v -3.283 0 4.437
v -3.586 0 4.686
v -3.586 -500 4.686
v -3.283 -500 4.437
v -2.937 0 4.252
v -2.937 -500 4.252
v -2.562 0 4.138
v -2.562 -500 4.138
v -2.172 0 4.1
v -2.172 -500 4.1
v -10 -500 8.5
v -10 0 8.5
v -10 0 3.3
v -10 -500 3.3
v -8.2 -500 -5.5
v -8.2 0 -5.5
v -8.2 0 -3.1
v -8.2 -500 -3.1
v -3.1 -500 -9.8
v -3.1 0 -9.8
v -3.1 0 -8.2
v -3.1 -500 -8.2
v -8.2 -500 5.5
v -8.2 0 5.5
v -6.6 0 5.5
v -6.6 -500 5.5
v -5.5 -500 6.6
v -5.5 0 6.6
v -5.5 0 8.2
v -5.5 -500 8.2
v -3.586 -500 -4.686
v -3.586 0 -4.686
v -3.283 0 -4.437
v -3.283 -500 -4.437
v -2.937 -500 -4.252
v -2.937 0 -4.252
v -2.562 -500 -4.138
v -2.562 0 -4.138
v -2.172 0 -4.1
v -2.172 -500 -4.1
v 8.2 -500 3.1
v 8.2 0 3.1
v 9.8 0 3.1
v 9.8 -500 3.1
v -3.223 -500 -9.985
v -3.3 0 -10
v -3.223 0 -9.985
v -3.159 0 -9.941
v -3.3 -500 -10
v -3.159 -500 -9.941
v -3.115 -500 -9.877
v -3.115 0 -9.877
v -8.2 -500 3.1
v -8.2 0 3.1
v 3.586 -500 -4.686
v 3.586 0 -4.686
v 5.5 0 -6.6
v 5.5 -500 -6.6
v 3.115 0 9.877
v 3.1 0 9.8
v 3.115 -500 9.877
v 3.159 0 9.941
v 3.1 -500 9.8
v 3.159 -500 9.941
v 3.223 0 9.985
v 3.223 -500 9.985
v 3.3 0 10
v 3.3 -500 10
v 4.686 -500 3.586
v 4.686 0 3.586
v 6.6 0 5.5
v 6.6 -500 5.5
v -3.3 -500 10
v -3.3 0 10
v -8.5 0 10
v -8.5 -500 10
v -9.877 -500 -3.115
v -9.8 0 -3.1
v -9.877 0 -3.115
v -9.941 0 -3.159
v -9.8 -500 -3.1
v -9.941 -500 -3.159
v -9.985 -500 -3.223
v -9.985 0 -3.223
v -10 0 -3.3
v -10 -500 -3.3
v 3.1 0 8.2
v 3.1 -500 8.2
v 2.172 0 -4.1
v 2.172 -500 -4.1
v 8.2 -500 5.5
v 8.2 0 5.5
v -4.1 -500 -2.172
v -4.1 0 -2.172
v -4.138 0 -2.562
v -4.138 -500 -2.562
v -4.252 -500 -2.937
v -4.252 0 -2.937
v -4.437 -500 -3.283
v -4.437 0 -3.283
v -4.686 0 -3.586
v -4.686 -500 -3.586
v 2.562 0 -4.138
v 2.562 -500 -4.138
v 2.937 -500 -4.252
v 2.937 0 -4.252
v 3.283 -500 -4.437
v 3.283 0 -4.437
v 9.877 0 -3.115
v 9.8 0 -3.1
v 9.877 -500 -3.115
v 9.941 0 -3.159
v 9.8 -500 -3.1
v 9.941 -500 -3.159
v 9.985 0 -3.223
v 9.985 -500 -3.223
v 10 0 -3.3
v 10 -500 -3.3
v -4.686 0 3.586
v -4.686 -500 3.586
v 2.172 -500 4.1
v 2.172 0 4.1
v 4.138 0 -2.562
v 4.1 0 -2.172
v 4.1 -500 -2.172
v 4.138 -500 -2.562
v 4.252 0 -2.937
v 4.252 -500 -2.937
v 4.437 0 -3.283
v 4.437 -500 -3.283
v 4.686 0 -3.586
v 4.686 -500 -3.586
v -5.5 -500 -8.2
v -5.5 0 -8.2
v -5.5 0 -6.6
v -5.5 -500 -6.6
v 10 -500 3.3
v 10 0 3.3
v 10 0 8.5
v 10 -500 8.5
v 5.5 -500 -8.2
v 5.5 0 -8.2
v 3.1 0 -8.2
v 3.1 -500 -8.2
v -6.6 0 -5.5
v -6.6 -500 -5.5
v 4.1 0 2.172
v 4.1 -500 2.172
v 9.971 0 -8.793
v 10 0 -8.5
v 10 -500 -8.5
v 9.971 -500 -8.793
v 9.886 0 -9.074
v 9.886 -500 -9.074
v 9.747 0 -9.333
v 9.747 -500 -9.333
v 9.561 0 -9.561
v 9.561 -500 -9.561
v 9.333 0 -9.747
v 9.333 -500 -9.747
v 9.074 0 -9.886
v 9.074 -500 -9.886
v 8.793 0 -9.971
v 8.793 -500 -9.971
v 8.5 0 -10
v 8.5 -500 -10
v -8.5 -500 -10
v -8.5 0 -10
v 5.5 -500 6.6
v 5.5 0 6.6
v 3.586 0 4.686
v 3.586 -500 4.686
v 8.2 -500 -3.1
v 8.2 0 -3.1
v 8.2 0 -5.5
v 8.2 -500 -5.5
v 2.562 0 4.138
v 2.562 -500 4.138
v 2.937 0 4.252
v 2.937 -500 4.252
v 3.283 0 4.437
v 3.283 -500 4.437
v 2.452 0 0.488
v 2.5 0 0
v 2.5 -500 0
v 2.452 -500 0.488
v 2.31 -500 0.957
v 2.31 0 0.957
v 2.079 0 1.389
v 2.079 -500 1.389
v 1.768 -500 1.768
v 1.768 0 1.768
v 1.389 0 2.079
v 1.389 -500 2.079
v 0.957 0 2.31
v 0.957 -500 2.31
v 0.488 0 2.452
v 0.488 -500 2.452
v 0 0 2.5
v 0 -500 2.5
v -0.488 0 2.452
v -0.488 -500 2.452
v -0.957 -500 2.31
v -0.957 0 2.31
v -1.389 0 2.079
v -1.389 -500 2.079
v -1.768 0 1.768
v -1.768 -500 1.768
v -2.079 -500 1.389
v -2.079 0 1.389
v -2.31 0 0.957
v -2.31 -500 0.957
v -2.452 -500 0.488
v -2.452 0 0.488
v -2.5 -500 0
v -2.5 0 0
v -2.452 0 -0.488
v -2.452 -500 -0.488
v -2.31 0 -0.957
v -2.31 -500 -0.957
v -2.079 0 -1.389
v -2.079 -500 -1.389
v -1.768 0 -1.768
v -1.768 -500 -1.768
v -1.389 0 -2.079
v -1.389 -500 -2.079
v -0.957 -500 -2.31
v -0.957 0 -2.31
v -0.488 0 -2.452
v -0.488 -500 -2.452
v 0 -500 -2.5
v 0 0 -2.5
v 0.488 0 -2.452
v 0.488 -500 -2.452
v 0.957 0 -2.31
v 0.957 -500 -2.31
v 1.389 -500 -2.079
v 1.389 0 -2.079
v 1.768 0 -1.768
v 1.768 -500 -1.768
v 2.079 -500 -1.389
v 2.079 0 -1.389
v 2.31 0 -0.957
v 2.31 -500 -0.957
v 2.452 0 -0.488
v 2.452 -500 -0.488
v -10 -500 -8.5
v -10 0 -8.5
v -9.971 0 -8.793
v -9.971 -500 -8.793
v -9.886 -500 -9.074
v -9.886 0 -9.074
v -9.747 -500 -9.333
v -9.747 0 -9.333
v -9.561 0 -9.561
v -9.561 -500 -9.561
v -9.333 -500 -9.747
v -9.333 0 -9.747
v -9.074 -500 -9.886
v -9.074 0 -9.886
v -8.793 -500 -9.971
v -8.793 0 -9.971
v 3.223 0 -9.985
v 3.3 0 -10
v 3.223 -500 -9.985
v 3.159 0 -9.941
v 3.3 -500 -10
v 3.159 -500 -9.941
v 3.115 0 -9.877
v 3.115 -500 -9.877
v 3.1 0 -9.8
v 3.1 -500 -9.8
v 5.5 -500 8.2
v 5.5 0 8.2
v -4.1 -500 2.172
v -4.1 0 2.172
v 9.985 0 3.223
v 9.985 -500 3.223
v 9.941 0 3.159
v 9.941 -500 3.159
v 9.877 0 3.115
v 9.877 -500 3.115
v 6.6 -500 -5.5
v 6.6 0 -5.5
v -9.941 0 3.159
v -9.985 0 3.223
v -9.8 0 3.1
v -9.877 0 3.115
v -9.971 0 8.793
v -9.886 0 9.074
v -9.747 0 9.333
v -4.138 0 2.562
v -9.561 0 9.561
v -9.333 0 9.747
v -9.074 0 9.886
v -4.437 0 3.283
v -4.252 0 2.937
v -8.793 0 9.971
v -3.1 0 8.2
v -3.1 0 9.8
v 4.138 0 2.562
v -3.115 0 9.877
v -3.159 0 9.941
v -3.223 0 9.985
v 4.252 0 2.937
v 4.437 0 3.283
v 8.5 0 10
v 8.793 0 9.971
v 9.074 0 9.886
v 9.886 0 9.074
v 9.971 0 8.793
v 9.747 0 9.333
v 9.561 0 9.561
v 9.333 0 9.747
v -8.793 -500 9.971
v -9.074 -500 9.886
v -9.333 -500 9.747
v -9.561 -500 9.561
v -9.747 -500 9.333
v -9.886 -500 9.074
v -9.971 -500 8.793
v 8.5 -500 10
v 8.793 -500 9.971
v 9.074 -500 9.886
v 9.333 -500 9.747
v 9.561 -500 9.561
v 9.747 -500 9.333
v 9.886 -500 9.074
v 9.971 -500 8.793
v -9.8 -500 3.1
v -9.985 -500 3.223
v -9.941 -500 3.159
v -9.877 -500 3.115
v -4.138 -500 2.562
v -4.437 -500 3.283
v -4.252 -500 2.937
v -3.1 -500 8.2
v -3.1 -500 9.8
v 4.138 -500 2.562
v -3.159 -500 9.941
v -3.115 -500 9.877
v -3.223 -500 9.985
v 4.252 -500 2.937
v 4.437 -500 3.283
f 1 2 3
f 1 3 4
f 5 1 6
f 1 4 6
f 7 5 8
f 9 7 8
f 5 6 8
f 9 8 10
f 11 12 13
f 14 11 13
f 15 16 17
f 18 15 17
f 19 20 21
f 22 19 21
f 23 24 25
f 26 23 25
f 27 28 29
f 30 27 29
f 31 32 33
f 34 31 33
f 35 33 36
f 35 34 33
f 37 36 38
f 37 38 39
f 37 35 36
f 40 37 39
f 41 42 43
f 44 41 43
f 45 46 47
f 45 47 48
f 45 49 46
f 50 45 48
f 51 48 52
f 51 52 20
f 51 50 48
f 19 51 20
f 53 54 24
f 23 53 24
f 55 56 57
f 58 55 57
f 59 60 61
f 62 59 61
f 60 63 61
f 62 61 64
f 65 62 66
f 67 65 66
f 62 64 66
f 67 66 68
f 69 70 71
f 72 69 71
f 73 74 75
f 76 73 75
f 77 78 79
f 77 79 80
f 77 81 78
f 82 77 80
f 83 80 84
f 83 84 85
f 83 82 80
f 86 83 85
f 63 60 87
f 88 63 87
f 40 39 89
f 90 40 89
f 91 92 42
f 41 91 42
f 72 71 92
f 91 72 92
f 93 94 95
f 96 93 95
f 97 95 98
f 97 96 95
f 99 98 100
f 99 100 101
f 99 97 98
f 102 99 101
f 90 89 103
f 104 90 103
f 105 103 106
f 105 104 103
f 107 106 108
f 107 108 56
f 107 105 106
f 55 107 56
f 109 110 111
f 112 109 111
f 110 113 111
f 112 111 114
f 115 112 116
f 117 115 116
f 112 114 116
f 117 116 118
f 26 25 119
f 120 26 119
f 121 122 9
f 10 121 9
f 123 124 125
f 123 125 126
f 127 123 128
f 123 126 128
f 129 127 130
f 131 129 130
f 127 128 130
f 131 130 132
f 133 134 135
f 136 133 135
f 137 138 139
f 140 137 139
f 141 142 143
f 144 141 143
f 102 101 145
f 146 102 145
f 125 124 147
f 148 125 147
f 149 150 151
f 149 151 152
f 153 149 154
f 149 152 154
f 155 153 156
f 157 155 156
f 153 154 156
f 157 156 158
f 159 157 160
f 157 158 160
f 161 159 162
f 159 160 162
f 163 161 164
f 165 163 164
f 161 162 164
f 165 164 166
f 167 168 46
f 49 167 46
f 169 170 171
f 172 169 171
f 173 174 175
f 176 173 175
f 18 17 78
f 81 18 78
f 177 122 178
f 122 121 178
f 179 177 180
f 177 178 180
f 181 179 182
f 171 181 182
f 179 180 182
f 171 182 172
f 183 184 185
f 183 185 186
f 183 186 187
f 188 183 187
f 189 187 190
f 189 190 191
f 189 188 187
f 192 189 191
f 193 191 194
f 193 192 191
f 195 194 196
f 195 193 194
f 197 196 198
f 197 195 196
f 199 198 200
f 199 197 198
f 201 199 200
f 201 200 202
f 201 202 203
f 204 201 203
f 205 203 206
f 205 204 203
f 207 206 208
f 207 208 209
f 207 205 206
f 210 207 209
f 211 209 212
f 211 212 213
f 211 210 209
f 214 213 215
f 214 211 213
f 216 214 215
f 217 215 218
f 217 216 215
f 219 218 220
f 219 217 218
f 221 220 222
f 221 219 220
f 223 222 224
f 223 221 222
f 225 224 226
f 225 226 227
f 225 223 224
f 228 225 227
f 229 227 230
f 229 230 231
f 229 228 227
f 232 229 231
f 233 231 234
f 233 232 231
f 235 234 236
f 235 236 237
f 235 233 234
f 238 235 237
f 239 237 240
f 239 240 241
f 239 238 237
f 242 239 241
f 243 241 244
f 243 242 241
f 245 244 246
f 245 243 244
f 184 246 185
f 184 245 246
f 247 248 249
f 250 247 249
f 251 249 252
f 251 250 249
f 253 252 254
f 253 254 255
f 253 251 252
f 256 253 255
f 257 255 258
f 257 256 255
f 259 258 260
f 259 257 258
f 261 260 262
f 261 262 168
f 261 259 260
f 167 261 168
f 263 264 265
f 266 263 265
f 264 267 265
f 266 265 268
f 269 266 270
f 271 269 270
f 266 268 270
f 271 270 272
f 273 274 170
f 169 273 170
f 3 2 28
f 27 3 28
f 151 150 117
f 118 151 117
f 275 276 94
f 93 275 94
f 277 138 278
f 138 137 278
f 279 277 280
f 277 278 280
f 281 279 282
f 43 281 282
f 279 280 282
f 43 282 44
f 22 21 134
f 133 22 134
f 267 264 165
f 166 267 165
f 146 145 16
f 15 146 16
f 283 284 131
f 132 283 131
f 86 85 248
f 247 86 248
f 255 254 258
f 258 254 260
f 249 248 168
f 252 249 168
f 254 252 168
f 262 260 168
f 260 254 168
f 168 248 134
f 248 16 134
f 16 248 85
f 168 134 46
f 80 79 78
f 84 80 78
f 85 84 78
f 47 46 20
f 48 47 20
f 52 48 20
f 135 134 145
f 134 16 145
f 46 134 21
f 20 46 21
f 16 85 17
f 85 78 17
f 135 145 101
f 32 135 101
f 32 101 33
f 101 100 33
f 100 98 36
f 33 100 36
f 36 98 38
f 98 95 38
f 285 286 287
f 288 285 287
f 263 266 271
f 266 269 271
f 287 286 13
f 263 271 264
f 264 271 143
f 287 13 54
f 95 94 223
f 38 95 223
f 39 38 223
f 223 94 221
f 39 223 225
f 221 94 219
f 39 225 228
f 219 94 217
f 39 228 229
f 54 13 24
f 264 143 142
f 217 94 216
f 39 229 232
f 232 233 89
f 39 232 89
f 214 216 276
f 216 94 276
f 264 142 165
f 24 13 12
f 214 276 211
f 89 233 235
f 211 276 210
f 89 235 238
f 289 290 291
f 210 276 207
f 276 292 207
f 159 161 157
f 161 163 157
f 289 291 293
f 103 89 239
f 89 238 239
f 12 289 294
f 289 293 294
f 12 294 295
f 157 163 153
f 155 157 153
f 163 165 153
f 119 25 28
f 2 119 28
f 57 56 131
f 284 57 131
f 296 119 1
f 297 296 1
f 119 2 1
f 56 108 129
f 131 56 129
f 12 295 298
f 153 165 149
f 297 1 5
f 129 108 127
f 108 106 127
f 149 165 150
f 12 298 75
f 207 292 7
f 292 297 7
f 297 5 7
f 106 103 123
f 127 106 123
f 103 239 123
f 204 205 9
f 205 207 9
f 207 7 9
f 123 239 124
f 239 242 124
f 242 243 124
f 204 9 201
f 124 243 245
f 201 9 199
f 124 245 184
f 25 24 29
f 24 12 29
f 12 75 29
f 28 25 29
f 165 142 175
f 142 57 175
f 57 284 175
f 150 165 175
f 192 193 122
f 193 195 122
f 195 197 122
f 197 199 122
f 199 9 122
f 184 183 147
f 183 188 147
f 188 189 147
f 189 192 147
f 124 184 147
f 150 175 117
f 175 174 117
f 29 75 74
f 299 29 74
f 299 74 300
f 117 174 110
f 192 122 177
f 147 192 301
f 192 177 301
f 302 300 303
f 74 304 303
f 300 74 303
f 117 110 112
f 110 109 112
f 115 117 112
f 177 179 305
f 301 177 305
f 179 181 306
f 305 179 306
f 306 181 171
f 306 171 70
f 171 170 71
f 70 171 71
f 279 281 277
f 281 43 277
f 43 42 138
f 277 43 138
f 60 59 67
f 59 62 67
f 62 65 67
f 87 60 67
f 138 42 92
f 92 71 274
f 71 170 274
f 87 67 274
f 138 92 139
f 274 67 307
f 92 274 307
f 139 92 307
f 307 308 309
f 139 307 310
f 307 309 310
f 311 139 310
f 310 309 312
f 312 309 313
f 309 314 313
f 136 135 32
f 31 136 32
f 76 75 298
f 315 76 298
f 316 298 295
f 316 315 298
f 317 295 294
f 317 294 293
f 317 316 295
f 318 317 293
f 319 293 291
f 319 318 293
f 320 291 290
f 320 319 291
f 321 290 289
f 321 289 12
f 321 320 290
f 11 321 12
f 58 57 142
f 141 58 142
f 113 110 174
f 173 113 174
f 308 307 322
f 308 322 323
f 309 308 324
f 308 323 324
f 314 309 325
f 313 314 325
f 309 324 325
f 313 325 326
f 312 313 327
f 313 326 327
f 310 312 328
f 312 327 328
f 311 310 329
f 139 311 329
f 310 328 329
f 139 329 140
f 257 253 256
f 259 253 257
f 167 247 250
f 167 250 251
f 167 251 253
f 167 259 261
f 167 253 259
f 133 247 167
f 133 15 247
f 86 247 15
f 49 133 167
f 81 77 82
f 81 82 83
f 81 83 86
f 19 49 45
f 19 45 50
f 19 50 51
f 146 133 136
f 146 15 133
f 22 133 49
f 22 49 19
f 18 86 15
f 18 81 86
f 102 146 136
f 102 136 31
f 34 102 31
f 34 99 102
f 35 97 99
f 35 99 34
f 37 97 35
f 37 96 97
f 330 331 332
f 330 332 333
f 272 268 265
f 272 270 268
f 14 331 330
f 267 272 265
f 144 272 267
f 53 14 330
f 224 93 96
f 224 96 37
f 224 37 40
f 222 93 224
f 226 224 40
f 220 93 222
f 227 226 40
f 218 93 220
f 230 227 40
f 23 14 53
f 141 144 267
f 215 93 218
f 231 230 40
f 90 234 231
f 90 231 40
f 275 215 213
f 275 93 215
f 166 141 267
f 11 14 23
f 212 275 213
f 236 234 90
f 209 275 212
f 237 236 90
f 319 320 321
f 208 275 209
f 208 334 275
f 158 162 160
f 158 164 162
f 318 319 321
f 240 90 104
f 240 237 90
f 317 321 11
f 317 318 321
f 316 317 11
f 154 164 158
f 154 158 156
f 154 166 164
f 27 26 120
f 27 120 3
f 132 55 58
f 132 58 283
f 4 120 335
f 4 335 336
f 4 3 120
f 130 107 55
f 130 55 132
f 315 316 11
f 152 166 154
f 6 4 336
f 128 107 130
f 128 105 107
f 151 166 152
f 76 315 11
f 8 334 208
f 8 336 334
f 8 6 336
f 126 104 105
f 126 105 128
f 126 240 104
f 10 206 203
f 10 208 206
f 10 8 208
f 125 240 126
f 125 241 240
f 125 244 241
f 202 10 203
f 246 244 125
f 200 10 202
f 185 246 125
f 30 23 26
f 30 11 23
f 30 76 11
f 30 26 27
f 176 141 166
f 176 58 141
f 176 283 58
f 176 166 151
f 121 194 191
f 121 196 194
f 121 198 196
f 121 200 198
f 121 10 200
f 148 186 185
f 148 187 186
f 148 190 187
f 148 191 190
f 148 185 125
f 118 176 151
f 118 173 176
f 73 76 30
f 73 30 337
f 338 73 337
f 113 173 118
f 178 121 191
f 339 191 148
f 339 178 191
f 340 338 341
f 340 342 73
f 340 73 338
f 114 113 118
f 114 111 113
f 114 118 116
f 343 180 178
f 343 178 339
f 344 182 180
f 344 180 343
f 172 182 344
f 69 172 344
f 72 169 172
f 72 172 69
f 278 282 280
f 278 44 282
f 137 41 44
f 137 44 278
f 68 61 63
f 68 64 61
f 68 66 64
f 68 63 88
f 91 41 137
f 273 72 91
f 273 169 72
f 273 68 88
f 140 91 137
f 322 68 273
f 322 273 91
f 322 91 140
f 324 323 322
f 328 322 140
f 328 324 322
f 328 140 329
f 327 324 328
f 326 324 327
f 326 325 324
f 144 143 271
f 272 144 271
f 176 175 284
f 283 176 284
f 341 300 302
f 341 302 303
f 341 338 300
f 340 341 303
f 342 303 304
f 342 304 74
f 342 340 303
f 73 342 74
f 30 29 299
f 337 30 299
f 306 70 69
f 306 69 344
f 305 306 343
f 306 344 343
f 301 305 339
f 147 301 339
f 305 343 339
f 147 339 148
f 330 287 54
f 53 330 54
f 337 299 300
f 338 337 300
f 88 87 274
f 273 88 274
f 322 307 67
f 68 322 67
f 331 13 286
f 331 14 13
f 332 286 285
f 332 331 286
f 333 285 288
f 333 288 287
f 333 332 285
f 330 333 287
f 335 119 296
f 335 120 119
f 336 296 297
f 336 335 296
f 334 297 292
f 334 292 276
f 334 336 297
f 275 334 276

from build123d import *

# Parameters (mm, degrees)
F0_R     = 2.5
F1_DEPTH = 500
F2_R     = 1.5
F3_R     = 2
F4_R     = 0.2


# Not quite as in the source:
# - a feature names something its author has since deleted; it is built from what else it names


with BuildPart() as f1:
    # F0 (on Front) → F1 (new body)
    with BuildSketch(Plane.XZ):
        Polygon((-3.1, 10), (-10, 10), (-10, 3.1), (-8.2, 3.1), (-8.2, 5.5), (-6.6, 5.5), (-4.1, 3), (-4.1, -3), (-6.6, -5.5), (-8.2, -5.5), (-8.2, -3.1), (-10, -3.1), (-10, -10), (-3.1, -10), (-3.1, -8.2), (-5.5, -8.2), (-5.5, -6.6), (-3, -4.1), (0, -4.1), (3, -4.1), (5.5, -6.6), (5.5, -8.2), (3.1, -8.2), (3.1, -10), (10, -10), (10, -3.1), (8.2, -3.1), (8.2, -5.5), (6.6, -5.5), (4.1, -3), (4.1, 3), (6.6, 5.5), (8.2, 5.5), (8.2, 3.1), (10, 3.1), (10, 10), (3.1, 10), (3.1, 8.2), (5.5, 8.2), (5.5, 6.6), (3, 4.1), (0, 4.1), (-3, 4.1), (-5.5, 6.6), (-5.5, 8.2), (-3.1, 8.2), align=None)
        Circle(F0_R, mode=Mode.SUBTRACT)
    extrude(amount=F1_DEPTH)

    # F2
    f2_edges = [f1.edges().sort_by_distance(p)[0] for p in [
        (-10, -250, 10),
        (10, -250, 10),
        (10, -250, -10),
        (-10, -250, -10),
    ]]
    fillet(f2_edges, radius=F2_R)

    # F3
    f3_edges = [f1.edges().sort_by_distance(p)[0] for p in [
        (-4.1, -250, 3),
        (-4.1, -250, -3),
        (3, -250, 4.1),
        (-3, -250, 4.1),
        (4.1, -250, 3),
        (4.1, -250, -3),
        (3, -250, -4.1),
        (-3, -250, -4.1),
    ]]
    fillet(f3_edges, radius=F3_R)

    # F4
    f4_edges = [f1.edges().sort_by_distance(p)[0] for p in [
        (-10, -250, 3.1),
        (-3.1, -250, -10),
        (3.1, -250, -10),
        (10, -250, -3.1),
        (10, -250, 3.1),
        (-10, -250, -3.1),
        (3.1, -250, 10),
        (-3.1, -250, 10),
    ]]
    fillet(f4_edges, radius=F4_R)


solid = f1.part
